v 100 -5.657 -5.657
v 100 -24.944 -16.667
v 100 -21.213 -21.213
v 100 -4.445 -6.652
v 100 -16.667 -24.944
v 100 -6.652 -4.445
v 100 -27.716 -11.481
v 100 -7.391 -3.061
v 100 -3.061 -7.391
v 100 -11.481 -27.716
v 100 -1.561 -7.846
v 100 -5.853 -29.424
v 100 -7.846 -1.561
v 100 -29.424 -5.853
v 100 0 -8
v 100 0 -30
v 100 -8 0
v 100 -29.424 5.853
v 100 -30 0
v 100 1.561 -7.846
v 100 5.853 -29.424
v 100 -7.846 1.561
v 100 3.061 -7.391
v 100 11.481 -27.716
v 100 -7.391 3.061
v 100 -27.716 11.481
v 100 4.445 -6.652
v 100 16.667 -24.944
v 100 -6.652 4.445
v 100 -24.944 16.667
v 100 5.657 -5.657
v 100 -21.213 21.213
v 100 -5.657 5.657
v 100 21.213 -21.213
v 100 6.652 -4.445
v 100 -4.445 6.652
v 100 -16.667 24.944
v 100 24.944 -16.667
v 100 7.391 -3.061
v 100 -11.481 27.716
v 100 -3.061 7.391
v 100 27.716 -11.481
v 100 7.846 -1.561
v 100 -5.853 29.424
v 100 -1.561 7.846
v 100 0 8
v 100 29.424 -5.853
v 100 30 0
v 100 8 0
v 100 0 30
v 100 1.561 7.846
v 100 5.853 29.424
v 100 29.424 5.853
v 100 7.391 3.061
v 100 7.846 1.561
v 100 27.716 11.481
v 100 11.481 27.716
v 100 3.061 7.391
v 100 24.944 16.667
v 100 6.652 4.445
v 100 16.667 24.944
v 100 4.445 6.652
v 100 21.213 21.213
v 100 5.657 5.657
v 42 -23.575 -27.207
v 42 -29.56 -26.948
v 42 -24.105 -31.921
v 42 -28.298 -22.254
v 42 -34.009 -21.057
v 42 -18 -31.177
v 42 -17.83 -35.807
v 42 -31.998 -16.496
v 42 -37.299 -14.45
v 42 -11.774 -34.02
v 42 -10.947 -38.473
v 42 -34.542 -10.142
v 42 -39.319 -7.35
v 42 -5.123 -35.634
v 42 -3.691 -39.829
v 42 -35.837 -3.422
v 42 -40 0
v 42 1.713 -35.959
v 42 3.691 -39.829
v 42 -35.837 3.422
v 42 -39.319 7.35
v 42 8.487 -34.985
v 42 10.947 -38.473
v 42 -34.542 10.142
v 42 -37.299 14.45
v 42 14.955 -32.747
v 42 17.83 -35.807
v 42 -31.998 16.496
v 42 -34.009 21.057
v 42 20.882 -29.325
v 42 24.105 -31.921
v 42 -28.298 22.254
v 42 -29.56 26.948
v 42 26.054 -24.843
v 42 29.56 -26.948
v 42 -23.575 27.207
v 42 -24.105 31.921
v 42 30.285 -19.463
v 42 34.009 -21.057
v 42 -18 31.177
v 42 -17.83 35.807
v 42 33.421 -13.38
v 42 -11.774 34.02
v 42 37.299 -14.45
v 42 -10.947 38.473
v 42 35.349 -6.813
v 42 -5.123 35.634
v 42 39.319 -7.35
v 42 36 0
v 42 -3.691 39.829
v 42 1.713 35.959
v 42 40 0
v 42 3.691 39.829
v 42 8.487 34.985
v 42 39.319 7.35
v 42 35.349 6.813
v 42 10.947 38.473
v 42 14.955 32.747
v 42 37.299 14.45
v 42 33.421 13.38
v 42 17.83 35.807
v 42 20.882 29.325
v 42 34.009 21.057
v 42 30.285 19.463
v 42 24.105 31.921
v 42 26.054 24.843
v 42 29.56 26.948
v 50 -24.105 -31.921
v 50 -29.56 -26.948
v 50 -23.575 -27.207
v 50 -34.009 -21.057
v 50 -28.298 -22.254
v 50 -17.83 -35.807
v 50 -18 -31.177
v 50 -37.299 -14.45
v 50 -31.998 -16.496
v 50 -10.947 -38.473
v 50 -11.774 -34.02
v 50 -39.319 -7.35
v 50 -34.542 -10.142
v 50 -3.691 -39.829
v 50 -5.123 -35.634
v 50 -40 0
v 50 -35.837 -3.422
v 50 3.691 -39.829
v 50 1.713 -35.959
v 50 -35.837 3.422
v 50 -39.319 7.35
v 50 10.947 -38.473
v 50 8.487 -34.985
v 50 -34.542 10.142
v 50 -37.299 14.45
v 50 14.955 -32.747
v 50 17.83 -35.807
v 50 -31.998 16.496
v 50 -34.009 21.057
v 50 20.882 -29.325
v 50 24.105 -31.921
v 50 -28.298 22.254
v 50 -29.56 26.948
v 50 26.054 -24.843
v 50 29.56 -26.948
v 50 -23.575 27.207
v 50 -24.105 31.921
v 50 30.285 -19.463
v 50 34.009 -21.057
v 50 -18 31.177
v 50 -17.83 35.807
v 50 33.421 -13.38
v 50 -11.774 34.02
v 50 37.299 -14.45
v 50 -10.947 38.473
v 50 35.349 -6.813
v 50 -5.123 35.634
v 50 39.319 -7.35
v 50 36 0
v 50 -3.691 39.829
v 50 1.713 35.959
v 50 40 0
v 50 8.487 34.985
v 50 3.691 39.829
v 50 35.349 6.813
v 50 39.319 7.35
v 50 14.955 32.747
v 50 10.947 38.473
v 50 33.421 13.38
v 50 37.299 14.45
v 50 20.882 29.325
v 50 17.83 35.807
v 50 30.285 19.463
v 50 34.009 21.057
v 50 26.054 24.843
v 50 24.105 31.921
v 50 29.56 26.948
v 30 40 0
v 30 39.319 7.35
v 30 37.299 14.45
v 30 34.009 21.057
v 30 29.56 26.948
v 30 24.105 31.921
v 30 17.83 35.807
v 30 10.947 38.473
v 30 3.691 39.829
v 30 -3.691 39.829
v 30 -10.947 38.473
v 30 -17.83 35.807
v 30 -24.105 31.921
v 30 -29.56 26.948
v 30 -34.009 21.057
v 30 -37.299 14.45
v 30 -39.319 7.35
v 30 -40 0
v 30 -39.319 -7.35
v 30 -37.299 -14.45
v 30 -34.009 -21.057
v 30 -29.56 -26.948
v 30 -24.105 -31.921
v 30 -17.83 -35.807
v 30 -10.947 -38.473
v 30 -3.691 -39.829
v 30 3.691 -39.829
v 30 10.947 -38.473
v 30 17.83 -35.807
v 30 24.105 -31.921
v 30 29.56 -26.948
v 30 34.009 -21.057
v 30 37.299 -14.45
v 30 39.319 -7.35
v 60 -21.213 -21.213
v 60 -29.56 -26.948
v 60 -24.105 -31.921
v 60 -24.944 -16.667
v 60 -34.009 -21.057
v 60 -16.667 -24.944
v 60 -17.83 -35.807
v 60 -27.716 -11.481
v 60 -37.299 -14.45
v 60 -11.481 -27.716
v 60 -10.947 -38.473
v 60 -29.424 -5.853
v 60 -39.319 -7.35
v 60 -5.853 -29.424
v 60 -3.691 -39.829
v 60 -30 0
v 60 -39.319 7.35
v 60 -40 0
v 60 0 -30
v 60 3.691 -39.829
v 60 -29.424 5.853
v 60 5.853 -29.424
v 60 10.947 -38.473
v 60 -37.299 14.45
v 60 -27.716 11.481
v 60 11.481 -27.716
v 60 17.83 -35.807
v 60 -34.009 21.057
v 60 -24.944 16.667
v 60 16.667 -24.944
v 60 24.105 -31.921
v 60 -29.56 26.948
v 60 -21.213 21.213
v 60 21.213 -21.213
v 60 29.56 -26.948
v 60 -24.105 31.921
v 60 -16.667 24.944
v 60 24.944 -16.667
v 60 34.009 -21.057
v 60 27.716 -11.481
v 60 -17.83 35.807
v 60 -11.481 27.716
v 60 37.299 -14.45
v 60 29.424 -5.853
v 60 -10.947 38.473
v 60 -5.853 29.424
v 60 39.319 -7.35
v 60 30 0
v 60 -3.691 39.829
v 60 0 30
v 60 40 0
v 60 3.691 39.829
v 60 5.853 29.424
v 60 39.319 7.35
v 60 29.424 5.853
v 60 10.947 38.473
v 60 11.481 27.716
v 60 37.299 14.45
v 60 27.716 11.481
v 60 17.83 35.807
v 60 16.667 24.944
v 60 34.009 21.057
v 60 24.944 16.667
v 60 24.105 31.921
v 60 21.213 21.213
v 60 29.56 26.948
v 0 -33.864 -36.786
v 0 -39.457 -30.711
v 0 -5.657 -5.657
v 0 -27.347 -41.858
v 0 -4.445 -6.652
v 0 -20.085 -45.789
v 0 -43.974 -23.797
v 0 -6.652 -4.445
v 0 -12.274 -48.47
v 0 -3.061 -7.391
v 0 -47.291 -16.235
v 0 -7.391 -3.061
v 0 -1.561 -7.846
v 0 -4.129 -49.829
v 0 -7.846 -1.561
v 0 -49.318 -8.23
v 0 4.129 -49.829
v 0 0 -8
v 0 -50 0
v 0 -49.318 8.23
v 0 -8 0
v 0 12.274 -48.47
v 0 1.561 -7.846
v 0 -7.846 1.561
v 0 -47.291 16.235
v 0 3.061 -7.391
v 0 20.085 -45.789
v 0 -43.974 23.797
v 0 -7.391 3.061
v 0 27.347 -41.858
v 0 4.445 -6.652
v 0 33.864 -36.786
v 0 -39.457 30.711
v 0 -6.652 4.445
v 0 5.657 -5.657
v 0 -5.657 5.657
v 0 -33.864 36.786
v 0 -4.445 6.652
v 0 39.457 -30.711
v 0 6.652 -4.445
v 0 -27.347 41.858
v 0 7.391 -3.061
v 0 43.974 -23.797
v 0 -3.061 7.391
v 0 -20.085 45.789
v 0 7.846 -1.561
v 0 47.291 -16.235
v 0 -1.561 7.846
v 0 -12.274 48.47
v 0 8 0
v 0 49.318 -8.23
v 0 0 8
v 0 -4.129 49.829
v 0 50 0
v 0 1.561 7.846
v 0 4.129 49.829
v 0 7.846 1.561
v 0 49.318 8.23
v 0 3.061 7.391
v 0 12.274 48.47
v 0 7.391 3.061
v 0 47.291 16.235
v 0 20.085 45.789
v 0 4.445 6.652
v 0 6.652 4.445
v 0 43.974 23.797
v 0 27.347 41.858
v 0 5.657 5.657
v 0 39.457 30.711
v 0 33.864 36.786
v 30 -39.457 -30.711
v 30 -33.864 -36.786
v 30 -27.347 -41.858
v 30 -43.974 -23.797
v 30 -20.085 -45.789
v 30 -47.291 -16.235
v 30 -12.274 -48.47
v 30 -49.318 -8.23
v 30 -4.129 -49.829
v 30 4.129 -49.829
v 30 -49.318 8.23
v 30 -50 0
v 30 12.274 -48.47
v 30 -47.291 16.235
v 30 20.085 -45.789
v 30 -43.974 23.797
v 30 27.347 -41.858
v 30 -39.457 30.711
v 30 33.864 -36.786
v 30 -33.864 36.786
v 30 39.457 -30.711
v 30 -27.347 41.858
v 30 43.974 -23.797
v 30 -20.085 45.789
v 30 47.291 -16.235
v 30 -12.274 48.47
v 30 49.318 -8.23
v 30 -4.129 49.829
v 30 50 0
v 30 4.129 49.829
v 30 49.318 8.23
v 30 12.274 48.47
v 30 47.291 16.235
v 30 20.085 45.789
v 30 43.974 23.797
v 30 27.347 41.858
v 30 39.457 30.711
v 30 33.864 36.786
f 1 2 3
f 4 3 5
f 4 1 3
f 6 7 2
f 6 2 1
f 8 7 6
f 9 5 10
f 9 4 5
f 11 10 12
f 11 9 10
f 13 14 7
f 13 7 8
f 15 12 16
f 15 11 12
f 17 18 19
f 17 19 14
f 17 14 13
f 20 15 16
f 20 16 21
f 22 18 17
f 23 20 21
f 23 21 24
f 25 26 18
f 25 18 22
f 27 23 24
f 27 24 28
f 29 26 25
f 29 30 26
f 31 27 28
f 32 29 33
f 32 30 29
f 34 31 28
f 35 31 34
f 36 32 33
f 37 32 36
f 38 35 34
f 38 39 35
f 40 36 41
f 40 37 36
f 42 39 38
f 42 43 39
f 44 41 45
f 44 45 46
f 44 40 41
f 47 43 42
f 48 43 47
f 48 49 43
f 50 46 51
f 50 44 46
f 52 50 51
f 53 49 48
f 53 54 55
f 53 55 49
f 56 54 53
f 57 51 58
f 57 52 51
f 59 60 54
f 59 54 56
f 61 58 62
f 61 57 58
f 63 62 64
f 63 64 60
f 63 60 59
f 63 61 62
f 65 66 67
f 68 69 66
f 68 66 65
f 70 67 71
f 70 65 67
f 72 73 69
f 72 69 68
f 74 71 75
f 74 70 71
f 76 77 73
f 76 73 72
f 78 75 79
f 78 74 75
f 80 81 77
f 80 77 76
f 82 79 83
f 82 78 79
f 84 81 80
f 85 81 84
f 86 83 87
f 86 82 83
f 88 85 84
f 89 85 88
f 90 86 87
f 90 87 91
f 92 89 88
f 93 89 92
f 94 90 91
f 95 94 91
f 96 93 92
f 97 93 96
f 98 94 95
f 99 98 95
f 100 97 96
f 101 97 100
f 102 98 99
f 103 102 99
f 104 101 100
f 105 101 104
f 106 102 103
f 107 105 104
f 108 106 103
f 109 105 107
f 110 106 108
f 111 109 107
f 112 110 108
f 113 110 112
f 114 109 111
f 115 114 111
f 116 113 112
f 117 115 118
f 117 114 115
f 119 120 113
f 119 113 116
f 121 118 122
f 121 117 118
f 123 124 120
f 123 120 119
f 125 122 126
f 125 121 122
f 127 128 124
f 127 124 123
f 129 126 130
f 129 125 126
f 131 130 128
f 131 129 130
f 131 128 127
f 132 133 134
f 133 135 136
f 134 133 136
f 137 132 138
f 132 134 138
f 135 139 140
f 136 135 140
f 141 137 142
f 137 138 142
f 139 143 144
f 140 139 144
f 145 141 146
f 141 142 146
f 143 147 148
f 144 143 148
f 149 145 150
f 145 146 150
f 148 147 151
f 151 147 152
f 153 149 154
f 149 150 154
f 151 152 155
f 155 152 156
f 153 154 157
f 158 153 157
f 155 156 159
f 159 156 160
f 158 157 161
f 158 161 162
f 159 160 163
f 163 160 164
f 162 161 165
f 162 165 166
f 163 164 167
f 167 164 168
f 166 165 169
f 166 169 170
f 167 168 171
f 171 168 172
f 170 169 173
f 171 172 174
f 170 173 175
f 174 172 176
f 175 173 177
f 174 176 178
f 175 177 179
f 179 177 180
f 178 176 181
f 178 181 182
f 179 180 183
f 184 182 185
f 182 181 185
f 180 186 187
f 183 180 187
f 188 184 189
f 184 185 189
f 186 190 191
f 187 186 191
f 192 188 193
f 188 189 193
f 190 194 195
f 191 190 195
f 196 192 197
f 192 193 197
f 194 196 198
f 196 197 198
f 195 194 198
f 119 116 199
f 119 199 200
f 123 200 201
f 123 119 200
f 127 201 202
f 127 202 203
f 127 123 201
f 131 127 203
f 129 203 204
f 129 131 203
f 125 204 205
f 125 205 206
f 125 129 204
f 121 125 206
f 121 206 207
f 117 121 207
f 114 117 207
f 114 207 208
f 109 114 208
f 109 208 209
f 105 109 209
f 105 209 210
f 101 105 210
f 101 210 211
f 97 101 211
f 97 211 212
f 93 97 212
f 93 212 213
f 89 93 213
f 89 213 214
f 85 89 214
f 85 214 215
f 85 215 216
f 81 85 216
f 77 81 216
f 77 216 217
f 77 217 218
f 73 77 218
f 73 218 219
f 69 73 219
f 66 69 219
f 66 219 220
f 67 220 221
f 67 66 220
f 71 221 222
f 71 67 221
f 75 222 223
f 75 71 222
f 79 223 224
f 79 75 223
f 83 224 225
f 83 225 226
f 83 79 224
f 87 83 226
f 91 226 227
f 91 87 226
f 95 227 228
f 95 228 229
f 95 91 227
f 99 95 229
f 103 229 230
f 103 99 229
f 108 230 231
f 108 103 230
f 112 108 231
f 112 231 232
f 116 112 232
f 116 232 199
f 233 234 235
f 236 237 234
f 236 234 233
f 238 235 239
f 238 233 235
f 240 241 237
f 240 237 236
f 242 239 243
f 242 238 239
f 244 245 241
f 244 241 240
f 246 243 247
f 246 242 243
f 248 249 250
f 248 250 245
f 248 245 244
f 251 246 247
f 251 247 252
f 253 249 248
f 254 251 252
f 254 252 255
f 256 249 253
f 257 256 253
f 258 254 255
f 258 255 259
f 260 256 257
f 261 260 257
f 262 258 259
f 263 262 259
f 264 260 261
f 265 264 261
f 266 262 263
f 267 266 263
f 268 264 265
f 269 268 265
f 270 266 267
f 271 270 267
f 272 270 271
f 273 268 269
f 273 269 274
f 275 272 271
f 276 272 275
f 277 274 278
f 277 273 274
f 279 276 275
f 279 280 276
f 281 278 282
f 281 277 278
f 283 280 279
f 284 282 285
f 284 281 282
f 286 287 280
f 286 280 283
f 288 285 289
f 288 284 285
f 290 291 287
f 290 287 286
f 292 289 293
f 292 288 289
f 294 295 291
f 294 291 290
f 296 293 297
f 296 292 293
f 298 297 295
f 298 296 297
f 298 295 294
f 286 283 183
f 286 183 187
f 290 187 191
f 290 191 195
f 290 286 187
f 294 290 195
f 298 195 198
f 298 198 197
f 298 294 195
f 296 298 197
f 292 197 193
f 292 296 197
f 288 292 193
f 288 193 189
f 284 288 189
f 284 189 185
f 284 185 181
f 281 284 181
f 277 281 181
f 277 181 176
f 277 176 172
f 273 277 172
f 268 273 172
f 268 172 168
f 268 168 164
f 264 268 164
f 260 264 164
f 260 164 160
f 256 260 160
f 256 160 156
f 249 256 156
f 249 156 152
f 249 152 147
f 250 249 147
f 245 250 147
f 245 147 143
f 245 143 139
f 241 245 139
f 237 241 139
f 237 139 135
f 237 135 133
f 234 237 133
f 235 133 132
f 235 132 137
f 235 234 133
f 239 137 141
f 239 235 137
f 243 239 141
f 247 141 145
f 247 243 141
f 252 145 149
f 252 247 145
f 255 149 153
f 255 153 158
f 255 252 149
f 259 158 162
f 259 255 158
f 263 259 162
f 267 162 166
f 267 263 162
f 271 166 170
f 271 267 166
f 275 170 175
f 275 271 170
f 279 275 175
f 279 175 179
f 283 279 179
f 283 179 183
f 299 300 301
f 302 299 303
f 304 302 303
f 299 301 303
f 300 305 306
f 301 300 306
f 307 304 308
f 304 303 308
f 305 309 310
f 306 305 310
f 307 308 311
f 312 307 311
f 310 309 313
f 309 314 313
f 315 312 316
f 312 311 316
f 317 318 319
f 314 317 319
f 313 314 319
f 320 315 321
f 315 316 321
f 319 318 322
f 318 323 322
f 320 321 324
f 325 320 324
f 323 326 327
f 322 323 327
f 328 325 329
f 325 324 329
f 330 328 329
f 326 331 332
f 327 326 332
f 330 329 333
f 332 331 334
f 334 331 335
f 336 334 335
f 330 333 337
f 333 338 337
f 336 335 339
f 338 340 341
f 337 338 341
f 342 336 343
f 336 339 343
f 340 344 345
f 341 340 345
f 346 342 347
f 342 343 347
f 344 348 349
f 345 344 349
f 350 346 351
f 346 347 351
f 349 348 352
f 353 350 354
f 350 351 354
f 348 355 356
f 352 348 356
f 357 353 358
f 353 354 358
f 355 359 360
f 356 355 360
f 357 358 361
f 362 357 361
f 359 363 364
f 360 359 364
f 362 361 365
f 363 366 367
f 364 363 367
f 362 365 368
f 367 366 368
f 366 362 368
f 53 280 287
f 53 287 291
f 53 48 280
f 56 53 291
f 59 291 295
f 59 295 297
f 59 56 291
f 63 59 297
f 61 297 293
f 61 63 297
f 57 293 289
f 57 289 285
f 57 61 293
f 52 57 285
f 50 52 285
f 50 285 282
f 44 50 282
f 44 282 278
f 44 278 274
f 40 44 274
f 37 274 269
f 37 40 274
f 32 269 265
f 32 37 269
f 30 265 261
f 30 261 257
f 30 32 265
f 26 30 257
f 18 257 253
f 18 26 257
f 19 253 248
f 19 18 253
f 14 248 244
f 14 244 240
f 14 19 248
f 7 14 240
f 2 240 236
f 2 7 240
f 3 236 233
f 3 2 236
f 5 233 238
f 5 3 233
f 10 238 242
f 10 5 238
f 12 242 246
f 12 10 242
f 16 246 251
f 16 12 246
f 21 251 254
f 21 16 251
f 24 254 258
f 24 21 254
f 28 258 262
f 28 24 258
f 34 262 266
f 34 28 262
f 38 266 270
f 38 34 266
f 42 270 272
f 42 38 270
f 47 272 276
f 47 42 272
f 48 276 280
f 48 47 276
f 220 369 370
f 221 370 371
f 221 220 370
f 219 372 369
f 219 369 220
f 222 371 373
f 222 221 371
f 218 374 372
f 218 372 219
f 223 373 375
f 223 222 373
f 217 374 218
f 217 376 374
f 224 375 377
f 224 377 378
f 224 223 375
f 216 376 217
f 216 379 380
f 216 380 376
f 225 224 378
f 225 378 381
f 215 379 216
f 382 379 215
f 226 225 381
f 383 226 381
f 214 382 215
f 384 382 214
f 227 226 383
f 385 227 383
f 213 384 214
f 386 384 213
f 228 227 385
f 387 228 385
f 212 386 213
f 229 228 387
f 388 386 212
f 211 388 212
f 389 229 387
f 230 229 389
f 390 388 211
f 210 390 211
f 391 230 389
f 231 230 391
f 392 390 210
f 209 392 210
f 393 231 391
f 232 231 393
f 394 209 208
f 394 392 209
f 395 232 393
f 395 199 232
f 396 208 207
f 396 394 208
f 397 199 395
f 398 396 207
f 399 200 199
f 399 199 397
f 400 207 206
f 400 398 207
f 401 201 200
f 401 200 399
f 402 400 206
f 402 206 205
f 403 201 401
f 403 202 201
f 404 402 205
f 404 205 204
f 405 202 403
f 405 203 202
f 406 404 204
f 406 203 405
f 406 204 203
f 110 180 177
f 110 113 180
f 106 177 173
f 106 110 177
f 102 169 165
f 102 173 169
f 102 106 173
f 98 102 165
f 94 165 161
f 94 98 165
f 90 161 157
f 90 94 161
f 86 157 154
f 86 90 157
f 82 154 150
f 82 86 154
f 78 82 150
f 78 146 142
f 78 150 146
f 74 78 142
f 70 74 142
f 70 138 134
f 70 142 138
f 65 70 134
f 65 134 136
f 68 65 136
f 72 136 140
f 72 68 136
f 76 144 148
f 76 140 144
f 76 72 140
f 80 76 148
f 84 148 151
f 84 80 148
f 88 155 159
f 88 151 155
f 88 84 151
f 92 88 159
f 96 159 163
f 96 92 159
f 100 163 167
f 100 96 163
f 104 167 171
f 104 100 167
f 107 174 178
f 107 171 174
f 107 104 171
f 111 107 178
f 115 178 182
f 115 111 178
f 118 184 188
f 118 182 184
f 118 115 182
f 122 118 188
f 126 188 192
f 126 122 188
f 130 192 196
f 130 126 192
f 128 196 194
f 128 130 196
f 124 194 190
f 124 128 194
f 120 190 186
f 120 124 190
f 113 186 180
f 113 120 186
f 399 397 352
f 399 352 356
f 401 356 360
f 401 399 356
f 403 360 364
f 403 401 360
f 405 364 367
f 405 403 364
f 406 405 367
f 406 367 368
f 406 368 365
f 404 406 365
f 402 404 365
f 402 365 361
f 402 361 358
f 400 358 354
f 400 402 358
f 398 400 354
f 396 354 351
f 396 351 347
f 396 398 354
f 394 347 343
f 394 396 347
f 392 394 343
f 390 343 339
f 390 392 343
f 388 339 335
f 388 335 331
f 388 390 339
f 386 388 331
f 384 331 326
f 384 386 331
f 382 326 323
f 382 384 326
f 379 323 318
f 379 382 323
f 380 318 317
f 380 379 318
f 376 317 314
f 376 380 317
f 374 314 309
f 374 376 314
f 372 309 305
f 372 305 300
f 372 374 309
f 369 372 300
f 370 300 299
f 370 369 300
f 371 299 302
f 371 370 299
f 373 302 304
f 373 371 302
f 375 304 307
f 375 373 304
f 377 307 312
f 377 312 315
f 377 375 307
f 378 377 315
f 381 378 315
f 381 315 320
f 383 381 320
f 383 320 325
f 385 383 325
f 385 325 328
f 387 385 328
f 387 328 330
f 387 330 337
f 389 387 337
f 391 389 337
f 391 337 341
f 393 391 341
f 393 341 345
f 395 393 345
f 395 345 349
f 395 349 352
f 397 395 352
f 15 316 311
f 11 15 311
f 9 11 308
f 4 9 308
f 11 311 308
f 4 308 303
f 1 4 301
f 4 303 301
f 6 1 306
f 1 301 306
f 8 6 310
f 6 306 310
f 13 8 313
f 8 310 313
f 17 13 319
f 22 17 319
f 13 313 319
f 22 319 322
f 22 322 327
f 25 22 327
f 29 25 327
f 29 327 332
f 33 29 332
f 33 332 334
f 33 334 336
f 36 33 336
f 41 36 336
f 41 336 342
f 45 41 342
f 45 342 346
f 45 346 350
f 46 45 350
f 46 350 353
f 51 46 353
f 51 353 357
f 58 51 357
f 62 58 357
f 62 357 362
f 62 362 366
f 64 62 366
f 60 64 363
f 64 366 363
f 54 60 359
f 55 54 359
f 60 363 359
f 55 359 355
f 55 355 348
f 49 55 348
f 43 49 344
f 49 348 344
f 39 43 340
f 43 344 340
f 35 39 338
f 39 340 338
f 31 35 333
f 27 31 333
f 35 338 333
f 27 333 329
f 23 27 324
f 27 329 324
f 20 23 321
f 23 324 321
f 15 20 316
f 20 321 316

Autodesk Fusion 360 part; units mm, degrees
sketch "Sketch1" plane through (0, 0, 0) normal (0, 0, 1) x (1, 0, 0)
  line L0 (0, 0) -> (100, 0)
  line L1 (0, 0) -> (0, 50)
  line L2 (0, 50) -> (30, 50)
  line L3 (30, 50) -> (30, 40)
  line L4 (60, 40) -> (60, 30)
  line L5 (60, 30) -> (100, 30)
  line L6 (100, 30) -> (100, 0)
  line L7 (50, 40) -> (50, 36)
  line L8 (50, 36) -> (42, 36)
  line L9 (42, 36) -> (42, 40)
  line L10 (30, 40) -> (42, 40)
  line L11 (50, 40) -> (60, 40)
  dimension "d1" = 100
  dimension "d2" = 50
  dimension "d3" = 4
  dimension "d4" = 8
revolve "Revolve1" add sketch "Sketch1" angle 360 about axis through (0, 0, 0) along (1, 0, 0)
sketch "Sketch2" plane through (100, 0, 0) normal (1, 0, 0) x (0, 1, 0)
  circle A0 centre (0, 0) radius 30
hole "Hole1" at (100, 0, 0) direction (-1, 0, 0) diameter 16 end through all
